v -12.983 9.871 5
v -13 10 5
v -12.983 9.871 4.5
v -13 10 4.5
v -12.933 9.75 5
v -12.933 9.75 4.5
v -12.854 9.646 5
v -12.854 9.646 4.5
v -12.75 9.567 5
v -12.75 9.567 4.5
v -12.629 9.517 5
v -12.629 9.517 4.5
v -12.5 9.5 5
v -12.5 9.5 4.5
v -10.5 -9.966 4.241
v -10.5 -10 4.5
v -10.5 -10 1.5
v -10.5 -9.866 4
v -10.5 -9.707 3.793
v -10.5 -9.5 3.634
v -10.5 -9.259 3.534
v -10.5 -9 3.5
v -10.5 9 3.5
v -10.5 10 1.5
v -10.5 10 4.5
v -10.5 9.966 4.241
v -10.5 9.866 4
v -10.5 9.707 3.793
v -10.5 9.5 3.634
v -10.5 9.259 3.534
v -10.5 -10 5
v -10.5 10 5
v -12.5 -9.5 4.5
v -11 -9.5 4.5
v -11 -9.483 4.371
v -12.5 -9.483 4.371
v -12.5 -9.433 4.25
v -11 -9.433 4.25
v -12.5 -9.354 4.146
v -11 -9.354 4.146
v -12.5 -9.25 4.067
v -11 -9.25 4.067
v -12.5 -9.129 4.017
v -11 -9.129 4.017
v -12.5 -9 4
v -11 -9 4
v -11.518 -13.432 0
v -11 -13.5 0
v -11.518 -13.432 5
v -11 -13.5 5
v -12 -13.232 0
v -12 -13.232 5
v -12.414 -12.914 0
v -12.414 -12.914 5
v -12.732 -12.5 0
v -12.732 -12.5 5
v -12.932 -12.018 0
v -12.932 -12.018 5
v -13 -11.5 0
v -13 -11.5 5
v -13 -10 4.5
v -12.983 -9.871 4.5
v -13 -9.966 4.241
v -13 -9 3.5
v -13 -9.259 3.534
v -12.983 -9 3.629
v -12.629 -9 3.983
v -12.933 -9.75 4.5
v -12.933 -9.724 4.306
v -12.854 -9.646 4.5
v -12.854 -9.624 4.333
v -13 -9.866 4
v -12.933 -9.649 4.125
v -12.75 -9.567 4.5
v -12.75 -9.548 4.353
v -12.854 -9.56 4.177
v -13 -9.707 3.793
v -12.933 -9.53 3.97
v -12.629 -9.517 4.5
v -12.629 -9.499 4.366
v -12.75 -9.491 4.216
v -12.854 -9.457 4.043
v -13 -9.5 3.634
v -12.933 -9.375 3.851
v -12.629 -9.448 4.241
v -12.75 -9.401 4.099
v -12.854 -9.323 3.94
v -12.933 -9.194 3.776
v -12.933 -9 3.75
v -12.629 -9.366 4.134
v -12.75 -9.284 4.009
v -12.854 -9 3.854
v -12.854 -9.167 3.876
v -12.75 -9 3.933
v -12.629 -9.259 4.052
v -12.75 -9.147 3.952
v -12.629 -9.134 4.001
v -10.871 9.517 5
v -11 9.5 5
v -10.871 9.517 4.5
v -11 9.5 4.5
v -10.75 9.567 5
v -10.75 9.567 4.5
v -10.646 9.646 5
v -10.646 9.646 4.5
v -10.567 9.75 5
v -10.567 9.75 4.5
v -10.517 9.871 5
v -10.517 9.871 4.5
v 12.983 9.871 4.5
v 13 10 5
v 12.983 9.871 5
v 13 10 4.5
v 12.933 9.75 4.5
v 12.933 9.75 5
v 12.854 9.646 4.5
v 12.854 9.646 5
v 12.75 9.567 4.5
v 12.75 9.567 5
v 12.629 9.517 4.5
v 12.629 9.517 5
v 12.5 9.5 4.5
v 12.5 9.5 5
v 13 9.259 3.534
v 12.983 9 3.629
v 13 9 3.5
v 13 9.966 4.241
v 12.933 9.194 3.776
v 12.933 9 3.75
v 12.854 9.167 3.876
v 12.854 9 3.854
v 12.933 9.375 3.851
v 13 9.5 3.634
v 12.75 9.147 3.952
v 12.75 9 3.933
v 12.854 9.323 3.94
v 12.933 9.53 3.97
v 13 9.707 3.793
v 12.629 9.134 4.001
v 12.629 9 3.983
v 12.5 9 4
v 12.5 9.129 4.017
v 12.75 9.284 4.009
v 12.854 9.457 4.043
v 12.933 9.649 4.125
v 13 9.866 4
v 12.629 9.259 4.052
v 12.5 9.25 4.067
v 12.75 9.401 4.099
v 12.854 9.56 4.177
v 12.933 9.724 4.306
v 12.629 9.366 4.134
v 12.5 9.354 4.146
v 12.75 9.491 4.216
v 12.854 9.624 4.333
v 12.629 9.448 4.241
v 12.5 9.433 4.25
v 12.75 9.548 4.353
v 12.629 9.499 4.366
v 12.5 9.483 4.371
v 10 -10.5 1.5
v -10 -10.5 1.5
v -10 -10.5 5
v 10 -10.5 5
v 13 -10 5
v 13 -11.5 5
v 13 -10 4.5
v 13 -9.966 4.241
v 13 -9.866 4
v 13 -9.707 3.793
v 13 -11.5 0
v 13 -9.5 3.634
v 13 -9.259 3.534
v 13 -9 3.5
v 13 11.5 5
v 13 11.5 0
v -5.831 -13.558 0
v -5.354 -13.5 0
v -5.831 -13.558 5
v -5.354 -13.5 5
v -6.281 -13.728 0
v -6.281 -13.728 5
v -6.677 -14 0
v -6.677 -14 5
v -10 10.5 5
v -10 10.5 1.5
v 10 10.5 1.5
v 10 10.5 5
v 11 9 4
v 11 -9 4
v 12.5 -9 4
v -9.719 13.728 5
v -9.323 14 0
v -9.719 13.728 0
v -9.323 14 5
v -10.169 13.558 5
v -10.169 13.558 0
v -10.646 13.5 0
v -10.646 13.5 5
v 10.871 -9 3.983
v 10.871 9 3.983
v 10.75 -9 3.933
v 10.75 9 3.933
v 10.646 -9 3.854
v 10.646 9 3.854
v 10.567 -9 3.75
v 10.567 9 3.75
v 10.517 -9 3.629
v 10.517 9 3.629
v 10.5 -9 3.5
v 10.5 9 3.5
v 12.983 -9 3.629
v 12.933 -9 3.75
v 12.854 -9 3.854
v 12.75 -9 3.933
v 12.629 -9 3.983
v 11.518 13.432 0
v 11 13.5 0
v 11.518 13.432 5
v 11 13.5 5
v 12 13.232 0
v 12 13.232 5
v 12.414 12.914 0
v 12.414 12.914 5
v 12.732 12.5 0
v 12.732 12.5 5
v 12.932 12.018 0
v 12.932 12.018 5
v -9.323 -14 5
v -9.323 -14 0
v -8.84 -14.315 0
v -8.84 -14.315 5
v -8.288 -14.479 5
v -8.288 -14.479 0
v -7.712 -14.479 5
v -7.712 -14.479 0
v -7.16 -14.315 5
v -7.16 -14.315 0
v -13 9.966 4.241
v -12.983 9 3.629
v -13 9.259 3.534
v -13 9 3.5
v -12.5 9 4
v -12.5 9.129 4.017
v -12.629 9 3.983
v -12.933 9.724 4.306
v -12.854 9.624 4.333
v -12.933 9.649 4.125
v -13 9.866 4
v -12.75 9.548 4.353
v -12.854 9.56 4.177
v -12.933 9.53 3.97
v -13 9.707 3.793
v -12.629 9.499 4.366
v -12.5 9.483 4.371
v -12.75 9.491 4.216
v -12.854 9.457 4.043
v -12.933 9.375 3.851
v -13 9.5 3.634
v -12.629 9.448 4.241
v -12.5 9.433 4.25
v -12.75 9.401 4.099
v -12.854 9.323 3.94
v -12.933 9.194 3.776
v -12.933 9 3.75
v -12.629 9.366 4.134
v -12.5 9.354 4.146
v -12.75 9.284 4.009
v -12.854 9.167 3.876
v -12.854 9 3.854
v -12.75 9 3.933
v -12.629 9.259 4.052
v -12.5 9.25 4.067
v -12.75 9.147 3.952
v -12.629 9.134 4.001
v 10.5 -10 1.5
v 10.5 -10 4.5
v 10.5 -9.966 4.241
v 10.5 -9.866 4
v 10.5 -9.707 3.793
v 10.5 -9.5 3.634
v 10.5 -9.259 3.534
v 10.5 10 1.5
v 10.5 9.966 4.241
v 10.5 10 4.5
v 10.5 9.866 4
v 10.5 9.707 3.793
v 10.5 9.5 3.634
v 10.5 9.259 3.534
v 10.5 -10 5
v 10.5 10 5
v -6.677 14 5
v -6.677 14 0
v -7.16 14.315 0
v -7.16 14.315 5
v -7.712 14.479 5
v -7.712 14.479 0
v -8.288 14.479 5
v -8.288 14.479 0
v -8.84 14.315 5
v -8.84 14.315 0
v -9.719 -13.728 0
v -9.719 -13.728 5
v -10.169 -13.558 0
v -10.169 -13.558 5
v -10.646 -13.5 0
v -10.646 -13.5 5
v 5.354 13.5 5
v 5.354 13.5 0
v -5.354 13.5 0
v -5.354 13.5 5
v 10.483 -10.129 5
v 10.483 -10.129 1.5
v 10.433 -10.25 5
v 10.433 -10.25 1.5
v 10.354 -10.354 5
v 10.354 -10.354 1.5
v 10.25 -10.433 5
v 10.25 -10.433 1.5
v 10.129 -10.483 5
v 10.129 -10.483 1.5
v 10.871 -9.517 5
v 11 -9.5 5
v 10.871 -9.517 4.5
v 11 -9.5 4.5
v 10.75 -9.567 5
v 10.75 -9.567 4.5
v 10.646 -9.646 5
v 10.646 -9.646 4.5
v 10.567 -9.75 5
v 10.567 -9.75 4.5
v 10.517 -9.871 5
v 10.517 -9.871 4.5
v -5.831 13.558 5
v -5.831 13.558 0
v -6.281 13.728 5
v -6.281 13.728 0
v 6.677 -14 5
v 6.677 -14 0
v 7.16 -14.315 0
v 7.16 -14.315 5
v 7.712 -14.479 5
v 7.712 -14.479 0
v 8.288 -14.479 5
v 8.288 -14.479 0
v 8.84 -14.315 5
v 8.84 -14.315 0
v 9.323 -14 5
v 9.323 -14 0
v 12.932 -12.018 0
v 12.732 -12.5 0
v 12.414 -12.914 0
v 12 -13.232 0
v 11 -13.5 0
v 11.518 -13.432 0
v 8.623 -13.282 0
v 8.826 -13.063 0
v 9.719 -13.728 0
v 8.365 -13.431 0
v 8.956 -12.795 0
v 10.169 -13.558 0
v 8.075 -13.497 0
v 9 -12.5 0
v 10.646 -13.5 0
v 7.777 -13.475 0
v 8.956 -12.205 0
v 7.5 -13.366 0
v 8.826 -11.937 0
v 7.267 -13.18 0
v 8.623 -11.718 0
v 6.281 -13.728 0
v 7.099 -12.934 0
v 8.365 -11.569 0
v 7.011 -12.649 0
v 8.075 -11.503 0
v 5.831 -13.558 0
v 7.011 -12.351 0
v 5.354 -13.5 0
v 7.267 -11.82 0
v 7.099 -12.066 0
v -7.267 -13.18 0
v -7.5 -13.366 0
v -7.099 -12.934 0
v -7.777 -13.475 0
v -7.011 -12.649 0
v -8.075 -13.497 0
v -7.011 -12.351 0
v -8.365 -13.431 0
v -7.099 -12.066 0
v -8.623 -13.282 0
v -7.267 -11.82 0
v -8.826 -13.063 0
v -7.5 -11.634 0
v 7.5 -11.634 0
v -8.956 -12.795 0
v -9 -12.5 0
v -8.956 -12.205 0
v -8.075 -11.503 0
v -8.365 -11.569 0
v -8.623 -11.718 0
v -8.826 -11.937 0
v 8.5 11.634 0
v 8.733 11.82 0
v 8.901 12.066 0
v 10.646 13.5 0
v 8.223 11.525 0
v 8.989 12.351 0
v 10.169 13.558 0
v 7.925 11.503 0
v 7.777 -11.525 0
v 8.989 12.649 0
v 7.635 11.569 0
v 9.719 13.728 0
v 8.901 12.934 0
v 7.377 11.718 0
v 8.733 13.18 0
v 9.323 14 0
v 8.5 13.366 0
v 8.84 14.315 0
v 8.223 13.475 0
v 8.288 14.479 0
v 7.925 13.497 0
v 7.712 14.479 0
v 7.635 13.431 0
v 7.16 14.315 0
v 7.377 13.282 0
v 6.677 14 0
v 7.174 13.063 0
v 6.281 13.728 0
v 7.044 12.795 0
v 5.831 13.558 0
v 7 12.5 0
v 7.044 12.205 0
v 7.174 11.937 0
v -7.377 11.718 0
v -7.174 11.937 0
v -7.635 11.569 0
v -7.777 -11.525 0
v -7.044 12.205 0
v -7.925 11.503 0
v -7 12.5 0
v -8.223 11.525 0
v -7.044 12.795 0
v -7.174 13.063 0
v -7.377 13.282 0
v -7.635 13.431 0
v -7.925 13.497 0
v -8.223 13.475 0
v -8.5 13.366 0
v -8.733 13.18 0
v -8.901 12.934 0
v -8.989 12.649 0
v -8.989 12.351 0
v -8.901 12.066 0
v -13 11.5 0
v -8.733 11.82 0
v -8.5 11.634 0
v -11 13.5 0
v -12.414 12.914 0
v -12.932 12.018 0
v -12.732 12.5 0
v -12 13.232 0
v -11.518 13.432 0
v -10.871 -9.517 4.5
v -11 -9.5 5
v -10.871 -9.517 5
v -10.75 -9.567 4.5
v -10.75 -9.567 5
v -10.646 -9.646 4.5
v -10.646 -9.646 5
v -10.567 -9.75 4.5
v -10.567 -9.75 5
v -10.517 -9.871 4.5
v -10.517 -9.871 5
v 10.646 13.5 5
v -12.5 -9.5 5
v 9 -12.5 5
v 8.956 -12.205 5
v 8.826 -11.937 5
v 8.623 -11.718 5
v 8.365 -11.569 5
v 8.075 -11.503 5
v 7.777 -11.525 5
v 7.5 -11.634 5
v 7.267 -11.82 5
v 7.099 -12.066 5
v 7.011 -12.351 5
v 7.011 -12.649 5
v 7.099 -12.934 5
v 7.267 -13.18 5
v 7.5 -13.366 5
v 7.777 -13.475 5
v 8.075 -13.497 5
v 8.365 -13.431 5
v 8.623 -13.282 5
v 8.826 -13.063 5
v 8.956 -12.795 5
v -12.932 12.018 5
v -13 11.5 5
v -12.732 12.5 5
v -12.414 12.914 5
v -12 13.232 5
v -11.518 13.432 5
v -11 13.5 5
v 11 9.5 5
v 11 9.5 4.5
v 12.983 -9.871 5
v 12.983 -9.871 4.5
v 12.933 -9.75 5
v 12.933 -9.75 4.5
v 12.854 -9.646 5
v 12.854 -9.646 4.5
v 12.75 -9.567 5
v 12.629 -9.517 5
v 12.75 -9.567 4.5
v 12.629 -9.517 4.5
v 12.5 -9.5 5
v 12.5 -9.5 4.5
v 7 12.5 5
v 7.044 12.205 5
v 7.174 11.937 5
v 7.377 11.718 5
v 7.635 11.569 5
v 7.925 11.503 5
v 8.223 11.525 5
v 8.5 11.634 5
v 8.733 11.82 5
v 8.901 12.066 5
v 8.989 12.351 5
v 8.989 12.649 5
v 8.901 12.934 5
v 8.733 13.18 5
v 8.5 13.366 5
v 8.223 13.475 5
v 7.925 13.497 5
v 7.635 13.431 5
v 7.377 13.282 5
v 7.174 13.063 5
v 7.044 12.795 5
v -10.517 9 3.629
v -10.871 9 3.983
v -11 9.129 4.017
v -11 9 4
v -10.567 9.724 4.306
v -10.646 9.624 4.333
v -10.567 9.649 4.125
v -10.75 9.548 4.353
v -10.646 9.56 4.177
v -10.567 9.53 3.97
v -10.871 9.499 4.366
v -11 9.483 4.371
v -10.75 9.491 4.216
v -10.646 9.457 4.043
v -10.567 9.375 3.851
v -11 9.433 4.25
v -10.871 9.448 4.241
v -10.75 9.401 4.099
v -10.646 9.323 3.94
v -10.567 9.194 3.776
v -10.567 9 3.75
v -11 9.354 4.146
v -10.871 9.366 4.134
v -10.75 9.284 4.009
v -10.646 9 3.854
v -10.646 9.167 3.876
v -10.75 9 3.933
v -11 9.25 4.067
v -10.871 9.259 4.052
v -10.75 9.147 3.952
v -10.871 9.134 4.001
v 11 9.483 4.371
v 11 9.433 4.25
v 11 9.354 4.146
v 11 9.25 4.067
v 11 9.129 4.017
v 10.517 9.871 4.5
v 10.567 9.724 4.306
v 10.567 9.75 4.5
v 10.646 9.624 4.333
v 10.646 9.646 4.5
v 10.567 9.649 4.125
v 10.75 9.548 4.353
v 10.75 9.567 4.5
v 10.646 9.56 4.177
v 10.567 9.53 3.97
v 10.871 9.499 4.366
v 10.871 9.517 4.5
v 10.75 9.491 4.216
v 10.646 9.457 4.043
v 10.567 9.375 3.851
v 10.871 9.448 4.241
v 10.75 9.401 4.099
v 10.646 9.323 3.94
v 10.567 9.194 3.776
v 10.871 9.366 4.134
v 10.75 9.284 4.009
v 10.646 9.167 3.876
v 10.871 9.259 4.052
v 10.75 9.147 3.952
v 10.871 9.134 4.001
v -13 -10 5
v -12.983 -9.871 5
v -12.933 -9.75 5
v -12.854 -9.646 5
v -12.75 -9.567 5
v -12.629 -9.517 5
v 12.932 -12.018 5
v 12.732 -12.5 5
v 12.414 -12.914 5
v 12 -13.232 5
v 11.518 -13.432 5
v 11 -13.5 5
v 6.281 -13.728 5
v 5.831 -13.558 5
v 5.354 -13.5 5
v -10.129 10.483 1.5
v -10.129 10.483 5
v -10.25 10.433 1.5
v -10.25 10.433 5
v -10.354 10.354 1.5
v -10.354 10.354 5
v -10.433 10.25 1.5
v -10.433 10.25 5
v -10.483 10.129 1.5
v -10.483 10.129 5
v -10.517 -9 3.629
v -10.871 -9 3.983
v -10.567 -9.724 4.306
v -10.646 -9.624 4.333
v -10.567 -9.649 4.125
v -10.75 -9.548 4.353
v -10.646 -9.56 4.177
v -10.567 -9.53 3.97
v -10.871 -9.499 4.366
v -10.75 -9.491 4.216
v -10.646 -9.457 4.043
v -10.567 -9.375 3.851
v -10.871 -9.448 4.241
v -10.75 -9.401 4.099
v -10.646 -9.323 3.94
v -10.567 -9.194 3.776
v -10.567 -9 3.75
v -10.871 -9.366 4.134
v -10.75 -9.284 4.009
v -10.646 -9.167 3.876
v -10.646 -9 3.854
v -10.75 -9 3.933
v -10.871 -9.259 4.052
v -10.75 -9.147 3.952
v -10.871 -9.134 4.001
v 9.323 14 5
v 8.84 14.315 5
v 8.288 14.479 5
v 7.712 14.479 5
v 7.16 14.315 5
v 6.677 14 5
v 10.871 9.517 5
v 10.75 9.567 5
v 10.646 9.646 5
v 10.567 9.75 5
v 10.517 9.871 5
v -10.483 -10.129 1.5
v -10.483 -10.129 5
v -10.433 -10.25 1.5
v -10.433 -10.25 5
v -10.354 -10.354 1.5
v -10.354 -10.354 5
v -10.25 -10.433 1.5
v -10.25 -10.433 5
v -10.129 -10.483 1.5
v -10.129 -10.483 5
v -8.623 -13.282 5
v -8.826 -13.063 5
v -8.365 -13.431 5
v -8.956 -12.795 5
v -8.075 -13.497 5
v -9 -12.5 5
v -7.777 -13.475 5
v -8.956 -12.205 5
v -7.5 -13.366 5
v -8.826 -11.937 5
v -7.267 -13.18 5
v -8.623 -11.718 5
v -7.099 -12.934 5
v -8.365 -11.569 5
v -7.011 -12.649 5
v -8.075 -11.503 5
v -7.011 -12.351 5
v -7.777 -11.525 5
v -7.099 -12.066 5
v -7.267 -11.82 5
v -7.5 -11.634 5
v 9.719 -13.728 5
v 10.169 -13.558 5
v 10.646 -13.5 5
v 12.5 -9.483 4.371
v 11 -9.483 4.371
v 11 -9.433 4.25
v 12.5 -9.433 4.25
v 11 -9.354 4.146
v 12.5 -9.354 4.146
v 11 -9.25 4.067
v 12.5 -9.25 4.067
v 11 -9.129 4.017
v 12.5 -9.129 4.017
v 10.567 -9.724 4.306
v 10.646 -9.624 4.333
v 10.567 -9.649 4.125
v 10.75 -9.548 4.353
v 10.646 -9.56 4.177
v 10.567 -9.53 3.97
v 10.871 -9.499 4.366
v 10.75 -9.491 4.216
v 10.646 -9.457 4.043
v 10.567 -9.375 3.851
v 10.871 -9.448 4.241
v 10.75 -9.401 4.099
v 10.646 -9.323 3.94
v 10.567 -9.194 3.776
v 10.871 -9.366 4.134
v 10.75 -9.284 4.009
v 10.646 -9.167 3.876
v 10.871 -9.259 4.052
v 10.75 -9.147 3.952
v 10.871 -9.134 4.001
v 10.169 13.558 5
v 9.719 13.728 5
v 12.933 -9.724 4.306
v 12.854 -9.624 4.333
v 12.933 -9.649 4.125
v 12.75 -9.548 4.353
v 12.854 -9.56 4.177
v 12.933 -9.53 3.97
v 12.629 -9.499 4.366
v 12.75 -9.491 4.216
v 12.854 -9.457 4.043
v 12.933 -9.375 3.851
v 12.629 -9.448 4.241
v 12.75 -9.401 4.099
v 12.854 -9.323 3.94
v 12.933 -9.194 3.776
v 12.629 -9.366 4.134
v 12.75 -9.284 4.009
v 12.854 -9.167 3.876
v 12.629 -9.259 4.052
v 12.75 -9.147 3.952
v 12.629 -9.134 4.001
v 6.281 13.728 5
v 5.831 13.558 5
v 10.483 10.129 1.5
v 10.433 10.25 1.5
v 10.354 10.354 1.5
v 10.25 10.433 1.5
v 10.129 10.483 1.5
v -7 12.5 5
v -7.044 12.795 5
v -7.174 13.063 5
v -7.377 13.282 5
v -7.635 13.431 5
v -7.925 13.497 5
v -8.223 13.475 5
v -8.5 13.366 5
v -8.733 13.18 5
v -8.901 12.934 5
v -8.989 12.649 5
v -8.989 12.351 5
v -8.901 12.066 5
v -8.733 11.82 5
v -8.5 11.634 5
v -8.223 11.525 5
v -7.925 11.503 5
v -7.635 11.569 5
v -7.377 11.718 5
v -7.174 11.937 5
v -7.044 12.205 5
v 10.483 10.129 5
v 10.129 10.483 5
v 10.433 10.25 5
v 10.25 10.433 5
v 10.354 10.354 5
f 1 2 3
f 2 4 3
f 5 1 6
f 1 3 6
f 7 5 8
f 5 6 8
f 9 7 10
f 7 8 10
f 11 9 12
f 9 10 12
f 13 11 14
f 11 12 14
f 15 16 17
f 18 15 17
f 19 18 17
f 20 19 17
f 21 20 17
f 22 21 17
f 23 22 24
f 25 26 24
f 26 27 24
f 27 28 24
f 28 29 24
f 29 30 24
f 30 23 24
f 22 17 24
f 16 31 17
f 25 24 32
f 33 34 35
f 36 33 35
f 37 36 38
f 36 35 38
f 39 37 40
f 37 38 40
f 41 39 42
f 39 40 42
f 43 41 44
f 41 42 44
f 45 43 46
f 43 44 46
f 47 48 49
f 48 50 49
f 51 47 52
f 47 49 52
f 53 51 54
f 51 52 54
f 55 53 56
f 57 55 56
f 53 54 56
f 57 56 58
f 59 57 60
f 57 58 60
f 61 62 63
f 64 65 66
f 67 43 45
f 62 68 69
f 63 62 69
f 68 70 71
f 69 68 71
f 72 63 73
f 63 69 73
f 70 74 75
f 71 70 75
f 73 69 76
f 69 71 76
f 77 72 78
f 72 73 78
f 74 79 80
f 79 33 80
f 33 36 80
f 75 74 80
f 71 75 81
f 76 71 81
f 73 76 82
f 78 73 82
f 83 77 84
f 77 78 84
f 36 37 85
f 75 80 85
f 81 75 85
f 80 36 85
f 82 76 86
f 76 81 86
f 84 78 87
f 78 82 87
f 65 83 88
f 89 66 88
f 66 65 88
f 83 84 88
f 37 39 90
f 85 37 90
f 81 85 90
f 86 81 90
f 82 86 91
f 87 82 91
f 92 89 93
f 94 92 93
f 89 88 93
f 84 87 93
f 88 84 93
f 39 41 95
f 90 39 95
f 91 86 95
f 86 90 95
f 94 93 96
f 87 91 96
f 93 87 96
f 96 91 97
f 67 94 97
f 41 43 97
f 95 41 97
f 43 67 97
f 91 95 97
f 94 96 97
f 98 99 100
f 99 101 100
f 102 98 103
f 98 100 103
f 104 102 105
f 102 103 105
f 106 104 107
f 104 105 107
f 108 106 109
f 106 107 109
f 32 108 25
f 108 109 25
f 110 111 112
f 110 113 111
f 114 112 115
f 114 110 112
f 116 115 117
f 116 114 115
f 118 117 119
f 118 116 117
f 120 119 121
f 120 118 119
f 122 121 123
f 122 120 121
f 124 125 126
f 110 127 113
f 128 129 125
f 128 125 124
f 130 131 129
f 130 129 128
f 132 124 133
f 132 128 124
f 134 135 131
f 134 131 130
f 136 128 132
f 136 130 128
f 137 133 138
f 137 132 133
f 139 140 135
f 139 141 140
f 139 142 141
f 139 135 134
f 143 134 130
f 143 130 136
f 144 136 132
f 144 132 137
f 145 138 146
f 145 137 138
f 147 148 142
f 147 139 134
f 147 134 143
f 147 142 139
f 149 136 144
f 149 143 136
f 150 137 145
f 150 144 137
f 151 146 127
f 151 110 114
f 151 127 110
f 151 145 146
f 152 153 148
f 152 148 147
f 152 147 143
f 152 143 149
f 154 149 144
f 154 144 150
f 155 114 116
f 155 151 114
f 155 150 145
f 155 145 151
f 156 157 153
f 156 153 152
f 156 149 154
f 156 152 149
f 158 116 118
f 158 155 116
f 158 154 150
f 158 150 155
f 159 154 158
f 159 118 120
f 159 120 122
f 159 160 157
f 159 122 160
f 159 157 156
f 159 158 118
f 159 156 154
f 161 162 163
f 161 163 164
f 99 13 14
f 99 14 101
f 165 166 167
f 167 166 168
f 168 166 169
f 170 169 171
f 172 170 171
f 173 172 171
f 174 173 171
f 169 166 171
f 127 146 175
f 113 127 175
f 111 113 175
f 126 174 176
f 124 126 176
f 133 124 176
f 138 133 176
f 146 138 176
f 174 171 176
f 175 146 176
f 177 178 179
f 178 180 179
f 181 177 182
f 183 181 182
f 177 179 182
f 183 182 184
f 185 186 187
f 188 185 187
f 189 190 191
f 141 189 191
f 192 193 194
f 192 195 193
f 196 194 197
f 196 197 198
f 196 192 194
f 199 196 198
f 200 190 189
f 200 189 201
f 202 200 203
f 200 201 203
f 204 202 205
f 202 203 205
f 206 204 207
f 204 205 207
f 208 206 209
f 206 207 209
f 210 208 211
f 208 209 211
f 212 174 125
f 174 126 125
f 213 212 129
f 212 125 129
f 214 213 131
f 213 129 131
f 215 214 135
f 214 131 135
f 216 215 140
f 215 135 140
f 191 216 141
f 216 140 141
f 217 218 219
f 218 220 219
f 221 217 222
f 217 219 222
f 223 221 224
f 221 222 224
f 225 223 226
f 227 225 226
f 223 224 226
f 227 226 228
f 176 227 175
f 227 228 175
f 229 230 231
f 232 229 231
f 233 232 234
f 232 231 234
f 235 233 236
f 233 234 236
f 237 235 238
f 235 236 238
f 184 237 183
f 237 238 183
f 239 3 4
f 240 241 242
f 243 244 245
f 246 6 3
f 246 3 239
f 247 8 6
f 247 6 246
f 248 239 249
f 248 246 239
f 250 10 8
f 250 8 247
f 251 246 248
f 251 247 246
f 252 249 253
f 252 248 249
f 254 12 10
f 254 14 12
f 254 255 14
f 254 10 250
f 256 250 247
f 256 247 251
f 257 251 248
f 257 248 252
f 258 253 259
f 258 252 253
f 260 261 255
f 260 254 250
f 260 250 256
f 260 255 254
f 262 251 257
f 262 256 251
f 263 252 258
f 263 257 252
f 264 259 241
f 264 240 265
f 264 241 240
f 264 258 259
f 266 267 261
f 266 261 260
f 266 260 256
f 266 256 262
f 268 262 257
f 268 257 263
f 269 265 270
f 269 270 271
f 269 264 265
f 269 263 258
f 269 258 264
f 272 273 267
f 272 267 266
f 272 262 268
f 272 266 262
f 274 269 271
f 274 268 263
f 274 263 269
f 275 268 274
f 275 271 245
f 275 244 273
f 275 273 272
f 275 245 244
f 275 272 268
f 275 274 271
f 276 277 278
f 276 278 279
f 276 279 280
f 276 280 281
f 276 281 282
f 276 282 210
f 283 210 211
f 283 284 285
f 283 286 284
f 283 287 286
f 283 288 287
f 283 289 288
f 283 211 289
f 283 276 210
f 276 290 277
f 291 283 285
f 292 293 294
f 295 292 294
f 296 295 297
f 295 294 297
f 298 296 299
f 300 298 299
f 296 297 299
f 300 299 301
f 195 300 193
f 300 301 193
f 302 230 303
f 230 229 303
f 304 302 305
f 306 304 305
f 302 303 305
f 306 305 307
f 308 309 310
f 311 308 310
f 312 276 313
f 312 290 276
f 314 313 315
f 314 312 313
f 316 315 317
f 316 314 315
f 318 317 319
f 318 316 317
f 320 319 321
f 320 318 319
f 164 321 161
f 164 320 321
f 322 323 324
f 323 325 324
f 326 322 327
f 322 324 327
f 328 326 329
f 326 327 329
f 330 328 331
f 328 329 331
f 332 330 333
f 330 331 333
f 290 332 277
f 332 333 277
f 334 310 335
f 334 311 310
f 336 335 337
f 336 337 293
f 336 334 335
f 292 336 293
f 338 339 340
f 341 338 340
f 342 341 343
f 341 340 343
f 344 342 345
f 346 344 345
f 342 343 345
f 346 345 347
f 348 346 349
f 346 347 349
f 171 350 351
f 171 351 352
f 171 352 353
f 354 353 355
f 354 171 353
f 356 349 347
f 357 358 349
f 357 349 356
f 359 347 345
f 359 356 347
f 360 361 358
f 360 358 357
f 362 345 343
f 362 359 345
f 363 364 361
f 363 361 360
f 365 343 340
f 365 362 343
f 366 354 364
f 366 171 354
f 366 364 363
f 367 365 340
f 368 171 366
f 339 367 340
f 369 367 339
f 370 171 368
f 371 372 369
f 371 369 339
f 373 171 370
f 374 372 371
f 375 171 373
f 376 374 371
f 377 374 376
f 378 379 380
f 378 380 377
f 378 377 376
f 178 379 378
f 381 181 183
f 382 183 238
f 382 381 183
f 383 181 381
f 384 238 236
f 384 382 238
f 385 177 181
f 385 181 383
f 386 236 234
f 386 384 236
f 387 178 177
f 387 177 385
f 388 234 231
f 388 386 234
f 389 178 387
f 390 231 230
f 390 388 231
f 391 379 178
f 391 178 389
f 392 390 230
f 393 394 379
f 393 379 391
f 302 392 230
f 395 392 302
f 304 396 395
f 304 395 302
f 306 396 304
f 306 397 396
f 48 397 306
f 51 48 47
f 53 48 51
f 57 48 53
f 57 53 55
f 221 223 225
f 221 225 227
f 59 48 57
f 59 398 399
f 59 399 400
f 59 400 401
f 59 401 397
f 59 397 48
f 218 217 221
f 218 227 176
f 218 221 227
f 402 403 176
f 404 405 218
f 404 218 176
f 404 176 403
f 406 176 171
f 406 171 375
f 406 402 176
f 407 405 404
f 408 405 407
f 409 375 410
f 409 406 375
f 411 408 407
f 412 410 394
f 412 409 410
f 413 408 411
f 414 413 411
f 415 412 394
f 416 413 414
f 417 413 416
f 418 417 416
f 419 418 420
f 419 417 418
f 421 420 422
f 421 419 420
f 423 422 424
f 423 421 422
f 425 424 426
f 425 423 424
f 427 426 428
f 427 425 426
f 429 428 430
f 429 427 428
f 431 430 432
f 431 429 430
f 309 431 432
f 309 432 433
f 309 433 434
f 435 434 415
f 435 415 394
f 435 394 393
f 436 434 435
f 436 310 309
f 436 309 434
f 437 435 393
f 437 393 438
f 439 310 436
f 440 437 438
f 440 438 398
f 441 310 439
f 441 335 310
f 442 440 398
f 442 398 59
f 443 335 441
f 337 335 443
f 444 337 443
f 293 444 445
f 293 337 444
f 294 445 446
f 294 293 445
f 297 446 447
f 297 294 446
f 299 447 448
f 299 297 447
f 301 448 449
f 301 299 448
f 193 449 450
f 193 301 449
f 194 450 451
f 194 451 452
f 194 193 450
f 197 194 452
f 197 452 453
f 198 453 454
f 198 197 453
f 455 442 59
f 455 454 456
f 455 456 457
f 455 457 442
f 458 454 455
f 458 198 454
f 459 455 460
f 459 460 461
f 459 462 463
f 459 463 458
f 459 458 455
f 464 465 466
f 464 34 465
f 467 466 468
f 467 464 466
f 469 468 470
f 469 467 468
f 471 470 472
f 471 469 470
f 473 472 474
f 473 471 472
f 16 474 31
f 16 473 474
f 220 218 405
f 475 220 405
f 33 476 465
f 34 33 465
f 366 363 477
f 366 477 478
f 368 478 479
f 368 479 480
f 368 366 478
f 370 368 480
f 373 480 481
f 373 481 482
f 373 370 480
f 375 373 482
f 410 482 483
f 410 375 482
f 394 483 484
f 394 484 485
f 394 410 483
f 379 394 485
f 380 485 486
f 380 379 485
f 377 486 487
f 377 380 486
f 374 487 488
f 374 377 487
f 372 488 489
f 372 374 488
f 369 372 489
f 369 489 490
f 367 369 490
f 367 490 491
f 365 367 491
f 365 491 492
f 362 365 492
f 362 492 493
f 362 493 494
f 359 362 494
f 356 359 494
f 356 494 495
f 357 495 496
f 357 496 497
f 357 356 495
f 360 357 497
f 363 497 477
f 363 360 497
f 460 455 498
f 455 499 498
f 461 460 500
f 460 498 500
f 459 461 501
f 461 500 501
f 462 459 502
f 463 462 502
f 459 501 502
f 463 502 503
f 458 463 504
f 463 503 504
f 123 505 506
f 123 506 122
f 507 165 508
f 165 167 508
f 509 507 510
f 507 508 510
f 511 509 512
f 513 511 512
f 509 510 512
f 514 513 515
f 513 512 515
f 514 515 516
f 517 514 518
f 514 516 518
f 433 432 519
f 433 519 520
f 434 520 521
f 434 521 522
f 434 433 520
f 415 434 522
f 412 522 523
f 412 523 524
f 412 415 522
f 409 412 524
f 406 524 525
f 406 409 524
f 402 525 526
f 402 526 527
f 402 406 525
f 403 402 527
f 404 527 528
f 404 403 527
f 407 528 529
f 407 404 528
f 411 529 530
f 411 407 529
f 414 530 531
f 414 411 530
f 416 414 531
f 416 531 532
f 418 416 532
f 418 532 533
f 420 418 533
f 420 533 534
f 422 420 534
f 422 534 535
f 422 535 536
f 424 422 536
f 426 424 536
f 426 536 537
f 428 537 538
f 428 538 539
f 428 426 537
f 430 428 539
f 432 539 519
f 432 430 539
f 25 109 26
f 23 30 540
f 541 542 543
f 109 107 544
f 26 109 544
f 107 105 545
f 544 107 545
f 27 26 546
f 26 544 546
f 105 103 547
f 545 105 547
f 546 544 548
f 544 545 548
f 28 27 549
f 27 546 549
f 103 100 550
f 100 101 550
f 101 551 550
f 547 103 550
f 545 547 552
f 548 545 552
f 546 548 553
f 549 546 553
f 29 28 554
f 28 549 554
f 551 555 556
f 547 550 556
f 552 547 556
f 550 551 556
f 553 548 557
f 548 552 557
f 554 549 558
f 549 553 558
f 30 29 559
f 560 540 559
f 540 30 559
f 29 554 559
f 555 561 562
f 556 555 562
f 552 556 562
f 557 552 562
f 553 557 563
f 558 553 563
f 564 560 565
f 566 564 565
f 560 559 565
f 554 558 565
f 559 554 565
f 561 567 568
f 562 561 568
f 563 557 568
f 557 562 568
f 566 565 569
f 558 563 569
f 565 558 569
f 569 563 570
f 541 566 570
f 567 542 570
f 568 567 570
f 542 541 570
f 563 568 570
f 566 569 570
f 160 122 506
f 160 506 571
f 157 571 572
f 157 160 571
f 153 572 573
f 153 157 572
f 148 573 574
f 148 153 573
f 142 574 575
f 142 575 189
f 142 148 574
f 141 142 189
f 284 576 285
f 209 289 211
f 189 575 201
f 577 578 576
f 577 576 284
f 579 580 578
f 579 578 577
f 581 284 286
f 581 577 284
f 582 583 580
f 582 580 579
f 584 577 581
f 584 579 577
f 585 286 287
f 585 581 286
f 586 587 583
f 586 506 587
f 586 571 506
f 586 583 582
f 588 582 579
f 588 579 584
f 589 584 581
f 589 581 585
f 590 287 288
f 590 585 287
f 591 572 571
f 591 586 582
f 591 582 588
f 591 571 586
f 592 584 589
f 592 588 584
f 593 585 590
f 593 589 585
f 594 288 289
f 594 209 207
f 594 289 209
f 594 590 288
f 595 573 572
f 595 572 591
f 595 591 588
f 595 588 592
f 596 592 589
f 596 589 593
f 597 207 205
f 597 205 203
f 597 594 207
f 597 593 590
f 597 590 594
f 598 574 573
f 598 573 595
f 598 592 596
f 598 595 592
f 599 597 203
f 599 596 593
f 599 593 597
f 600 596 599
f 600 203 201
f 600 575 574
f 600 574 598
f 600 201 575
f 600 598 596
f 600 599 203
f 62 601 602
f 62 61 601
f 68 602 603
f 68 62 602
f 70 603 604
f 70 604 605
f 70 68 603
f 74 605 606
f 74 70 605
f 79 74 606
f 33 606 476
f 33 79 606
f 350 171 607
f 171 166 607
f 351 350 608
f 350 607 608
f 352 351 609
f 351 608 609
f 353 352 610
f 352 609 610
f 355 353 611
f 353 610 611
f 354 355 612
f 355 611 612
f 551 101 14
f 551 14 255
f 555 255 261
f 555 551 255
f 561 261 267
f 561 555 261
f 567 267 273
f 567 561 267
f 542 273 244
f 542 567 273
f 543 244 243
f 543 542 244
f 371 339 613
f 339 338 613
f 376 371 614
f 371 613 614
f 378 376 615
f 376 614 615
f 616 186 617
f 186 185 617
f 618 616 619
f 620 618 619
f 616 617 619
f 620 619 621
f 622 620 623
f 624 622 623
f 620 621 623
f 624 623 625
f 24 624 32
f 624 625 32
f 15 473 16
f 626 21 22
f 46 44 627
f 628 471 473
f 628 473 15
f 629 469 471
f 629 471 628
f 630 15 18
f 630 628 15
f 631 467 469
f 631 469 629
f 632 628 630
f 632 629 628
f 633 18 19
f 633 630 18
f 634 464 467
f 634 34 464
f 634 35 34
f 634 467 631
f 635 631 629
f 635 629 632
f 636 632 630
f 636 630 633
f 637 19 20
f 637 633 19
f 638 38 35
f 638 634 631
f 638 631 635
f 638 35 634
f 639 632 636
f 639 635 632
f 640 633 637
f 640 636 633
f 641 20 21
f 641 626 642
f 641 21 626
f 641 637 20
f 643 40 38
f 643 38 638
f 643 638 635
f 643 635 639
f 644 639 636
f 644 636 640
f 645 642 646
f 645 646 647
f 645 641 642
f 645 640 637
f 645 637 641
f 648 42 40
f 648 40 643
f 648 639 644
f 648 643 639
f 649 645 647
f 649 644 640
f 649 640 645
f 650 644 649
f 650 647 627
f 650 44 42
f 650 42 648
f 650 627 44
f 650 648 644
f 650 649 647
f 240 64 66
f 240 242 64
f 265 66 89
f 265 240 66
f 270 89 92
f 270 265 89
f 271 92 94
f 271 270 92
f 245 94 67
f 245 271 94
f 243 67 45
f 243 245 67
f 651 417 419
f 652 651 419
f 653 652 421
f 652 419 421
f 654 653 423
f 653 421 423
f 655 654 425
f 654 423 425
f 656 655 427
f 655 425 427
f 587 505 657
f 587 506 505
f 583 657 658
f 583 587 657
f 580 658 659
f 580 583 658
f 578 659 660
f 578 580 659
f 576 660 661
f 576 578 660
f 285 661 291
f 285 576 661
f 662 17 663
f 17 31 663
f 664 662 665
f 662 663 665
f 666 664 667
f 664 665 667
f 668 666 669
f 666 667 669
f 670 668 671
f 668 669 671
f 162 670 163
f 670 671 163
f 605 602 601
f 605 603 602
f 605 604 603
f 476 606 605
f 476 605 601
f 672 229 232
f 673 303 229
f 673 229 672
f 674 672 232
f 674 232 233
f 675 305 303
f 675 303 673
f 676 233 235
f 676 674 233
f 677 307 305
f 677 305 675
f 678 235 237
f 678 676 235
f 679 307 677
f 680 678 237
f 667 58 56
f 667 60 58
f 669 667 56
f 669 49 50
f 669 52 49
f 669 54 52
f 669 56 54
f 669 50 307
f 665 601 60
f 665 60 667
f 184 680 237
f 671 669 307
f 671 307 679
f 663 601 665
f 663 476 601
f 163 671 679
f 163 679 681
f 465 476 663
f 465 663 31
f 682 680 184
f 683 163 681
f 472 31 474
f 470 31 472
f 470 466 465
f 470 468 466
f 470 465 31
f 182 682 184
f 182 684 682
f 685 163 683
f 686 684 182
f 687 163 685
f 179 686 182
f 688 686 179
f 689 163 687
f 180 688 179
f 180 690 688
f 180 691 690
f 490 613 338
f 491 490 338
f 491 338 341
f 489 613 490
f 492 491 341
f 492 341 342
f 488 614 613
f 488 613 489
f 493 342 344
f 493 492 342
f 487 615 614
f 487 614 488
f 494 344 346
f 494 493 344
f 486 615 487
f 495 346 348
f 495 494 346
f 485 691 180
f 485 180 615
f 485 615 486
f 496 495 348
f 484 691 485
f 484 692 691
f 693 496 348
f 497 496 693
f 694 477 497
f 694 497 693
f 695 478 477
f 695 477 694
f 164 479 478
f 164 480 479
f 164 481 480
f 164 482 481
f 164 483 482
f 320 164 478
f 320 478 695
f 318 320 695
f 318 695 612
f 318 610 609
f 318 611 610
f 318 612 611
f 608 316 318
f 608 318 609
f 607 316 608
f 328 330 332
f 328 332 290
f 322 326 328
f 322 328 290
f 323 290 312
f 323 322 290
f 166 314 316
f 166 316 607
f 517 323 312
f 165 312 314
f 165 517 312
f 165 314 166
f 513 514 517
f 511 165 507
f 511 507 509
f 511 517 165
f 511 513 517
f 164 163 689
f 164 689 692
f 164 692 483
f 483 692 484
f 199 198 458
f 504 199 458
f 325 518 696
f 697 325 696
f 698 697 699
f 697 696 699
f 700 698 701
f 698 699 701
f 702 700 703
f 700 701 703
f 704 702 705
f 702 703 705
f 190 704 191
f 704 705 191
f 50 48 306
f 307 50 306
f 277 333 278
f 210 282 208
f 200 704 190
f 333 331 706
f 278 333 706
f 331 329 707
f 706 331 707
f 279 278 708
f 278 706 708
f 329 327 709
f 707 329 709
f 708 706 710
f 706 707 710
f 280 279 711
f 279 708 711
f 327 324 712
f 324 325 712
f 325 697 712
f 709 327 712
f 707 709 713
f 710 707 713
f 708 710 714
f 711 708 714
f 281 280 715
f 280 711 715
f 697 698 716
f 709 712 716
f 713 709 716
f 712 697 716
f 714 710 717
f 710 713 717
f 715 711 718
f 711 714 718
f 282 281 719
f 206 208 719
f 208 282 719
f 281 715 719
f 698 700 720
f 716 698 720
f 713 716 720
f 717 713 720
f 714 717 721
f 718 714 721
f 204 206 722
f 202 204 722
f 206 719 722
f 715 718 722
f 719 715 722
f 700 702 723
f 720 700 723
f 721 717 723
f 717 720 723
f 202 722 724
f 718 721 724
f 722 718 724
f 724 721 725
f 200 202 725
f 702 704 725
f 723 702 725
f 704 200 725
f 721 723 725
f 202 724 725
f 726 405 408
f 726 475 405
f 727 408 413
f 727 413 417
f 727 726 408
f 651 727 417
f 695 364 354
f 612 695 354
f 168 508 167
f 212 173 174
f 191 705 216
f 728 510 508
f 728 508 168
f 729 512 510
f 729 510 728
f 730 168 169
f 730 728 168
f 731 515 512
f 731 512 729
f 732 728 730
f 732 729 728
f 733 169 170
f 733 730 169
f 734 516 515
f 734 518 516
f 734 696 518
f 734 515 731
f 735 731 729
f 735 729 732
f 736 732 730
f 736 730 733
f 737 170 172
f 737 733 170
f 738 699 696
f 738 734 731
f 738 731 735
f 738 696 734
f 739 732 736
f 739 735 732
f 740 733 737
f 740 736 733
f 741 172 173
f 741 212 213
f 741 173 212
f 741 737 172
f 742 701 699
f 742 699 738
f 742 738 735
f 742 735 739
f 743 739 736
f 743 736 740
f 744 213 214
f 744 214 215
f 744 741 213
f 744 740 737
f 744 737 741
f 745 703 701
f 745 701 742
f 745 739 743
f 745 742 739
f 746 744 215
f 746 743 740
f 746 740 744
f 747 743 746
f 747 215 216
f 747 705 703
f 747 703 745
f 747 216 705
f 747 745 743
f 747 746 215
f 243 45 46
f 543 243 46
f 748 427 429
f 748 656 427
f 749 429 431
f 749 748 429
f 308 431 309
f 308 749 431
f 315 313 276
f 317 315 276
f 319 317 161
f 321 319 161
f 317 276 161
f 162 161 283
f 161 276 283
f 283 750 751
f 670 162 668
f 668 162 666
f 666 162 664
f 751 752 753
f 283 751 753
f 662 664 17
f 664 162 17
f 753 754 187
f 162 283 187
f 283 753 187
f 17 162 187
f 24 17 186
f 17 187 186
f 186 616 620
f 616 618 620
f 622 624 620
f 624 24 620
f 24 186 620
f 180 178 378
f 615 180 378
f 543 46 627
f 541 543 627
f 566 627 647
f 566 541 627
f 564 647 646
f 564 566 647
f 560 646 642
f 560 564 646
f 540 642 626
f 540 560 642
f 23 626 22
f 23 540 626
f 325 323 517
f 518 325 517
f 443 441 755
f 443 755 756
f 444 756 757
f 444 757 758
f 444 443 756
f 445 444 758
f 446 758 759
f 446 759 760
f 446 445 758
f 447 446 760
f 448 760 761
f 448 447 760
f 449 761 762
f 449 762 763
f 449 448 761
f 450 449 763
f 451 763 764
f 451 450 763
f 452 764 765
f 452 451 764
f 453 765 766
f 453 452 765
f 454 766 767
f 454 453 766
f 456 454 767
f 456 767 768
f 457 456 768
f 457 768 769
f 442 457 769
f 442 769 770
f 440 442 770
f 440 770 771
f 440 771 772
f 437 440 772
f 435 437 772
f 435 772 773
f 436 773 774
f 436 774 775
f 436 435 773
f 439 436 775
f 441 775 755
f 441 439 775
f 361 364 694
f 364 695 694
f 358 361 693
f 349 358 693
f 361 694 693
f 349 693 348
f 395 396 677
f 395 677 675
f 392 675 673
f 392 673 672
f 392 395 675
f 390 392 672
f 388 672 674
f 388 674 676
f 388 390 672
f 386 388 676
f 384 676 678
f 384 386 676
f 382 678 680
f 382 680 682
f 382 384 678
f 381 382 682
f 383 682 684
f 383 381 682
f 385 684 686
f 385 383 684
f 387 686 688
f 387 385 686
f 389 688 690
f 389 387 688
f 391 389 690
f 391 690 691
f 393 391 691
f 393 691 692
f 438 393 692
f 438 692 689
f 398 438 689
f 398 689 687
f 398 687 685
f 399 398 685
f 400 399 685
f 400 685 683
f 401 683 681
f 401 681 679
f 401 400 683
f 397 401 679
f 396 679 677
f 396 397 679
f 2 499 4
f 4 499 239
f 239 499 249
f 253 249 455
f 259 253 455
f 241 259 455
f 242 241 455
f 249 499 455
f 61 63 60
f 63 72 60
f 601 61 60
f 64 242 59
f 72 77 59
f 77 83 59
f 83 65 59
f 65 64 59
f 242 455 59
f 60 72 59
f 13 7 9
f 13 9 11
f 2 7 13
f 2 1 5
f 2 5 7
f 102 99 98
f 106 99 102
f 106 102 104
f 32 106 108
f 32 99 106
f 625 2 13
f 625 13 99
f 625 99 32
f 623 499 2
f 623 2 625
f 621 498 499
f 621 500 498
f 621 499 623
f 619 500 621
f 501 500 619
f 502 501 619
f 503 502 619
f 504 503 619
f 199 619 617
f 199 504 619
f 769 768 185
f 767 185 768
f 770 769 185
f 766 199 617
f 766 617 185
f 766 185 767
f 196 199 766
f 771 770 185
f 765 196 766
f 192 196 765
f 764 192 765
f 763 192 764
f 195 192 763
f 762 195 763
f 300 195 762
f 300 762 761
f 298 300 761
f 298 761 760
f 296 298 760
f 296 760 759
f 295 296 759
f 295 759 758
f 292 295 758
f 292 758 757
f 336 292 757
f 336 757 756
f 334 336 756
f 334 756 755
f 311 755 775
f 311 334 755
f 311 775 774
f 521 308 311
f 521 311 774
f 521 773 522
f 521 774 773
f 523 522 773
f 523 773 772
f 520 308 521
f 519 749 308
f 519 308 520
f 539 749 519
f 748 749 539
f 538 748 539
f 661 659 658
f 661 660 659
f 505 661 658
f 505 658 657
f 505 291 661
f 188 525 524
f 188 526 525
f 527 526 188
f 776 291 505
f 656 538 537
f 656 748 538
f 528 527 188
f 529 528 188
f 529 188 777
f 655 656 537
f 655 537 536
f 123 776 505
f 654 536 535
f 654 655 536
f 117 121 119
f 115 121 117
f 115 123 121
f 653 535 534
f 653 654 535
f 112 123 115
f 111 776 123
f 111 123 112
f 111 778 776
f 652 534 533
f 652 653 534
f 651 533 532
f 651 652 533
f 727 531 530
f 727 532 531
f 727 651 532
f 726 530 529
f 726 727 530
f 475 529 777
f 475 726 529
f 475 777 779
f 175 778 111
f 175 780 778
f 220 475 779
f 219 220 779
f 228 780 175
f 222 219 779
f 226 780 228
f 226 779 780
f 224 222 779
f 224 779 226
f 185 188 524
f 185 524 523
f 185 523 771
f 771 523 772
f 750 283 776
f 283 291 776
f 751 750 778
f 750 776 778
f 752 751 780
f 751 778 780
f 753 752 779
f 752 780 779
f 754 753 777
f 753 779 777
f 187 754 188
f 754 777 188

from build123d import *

# Parameters (mm, degrees)
ESQUISSE1_R             = 1
ESQUISSE1_W             = 21
ESQUISSE1_H             = 21
BOSS_EXTRU_1_DEPTH      = 5
ESQUISSE2_W             = 21
ESQUISSE2_H             = 21
BOSS_EXTRU_2_DEPTH      = 1.5
ESQUISSE3_W             = 2.5
ESQUISSE3_H             = 19
ENL_V_MAT_EXTRU_1_DEPTH = 1
CONG_1_R                = 2
CONG_2_R                = 2
CONG_3_R                = 0.5


with BuildPart() as part:
    # Esquisse1 → Boss.-Extru.1 (new body)
    with BuildSketch(Plane.XY):
        with BuildLine():
            Line((13, 13.5), (9.732050808, 13.5))
            ThreePointArc((9.732050808, 13.5), (8, 14.5), (6.267949192, 13.5))
            Line((6.267949192, 13.5), (-6.267949192, 13.5))
            ThreePointArc((-6.267949192, 13.5), (-8, 14.5), (-9.732050808, 13.5))
            Line((-9.732050808, 13.5), (-13, 13.5))
            Line((-13, 13.5), (-13, -13.5))
            Line((-13, -13.5), (-9.732050808, -13.5))
            ThreePointArc((-9.732050808, -13.5), (-8, -14.5), (-6.267949192, -13.5))
            Line((-6.267949192, -13.5), (6.267949192, -13.5))
            ThreePointArc((6.267949192, -13.5), (8, -14.5), (9.732050808, -13.5))
            Line((9.732050808, -13.5), (13, -13.5))
            Line((13, -13.5), (13, 13.5))
        make_face()
        with Locations((-8, 12.5)):
            Circle(ESQUISSE1_R, mode=Mode.SUBTRACT)
        with Locations(Location((8, 12.5, 0), (0, 0, 180))):
            Circle(ESQUISSE1_R, mode=Mode.SUBTRACT)
        with Locations((8, -12.5)):
            Circle(ESQUISSE1_R, mode=Mode.SUBTRACT)
        with Locations(Location((-8, -12.5, 0), (0, 0, 180))):
            Circle(ESQUISSE1_R, mode=Mode.SUBTRACT)
        Rectangle(ESQUISSE1_W, ESQUISSE1_H, mode=Mode.SUBTRACT)
    extrude(amount=BOSS_EXTRU_1_DEPTH)

    # Esquisse2 → Boss.-Extru.2 (add)
    with BuildSketch(Plane(origin=(0, 0, 0), x_dir=(-1, 0, 0), z_dir=(0, 0, -1))):
        Rectangle(ESQUISSE2_W, ESQUISSE2_H)
    extrude(amount=-BOSS_EXTRU_2_DEPTH)

    # Esquisse3 → Enlèv. mat.-Extru.1 (cut)
    with BuildSketch(Plane.XY.offset(5)):
        with Locations((-11.75, 0)):
            Rectangle(ESQUISSE3_W, ESQUISSE3_H)
        with Locations((11.75, 0)):
            Rectangle(ESQUISSE3_W, ESQUISSE3_H)
    extrude(amount=-ENL_V_MAT_EXTRU_1_DEPTH, mode=Mode.SUBTRACT)

    # Congé1
    cong_1_edges = [part.edges().sort_by_distance(p)[0] for p in [
        (-13, -13.5, 2.5),
        (-13, 13.5, 2.5),
        (13, 13.5, 2.5),
        (13, -13.5, 2.5),
    ]]
    fillet(cong_1_edges, radius=CONG_1_R)

    # Congé2
    cong_2_edges = [part.edges().sort_by_distance(p)[0] for p in [
        (-9.732050808, 13.5, 2.5),
        (-6.267949192, 13.5, 2.5),
        (6.267949192, 13.5, 2.5),
        (9.732050808, 13.5, 2.5),
        (9.732050808, -13.5, 2.5),
        (6.267949192, -13.5, 2.5),
        (-6.267949192, -13.5, 2.5),
        (-9.732050808, -13.5, 2.5),
    ]]
    fillet(cong_2_edges, radius=CONG_2_R)

    # Congé3
    cong_3_edges = [part.edges().sort_by_distance(p)[0] for p in [
        (13, -9.5, 4.5),
        (-13, 9.5, 4.5),
        (-13, -9.5, 4.5),
        (-10.5, -9.5, 4.5),
        (-10.5, 9.5, 4.5),
        (10.5, 9.5, 4.5),
        (10.5, -9.5, 4.5),
        (13, 0, 4),
        (-13, 0, 4),
        (-10.5, 0, 4),
        (10.5, 0, 4),
        (13, 9.5, 4.5),
        (11.75, -9.5, 4),
        (11.75, 9.5, 4),
        (-11.75, 9.5, 4),
        (-11.75, -9.5, 4),
        (-10.5, -10.5, 3.25),
        (10.5, -10.5, 3.25),
        (10.5, 10.5, 3.25),
        (-10.5, 10.5, 3.25),
    ]]
    fillet(cong_3_edges, radius=CONG_3_R - 0.0001)  # a hair under: the kernel refuses the full size


solid = part.part
